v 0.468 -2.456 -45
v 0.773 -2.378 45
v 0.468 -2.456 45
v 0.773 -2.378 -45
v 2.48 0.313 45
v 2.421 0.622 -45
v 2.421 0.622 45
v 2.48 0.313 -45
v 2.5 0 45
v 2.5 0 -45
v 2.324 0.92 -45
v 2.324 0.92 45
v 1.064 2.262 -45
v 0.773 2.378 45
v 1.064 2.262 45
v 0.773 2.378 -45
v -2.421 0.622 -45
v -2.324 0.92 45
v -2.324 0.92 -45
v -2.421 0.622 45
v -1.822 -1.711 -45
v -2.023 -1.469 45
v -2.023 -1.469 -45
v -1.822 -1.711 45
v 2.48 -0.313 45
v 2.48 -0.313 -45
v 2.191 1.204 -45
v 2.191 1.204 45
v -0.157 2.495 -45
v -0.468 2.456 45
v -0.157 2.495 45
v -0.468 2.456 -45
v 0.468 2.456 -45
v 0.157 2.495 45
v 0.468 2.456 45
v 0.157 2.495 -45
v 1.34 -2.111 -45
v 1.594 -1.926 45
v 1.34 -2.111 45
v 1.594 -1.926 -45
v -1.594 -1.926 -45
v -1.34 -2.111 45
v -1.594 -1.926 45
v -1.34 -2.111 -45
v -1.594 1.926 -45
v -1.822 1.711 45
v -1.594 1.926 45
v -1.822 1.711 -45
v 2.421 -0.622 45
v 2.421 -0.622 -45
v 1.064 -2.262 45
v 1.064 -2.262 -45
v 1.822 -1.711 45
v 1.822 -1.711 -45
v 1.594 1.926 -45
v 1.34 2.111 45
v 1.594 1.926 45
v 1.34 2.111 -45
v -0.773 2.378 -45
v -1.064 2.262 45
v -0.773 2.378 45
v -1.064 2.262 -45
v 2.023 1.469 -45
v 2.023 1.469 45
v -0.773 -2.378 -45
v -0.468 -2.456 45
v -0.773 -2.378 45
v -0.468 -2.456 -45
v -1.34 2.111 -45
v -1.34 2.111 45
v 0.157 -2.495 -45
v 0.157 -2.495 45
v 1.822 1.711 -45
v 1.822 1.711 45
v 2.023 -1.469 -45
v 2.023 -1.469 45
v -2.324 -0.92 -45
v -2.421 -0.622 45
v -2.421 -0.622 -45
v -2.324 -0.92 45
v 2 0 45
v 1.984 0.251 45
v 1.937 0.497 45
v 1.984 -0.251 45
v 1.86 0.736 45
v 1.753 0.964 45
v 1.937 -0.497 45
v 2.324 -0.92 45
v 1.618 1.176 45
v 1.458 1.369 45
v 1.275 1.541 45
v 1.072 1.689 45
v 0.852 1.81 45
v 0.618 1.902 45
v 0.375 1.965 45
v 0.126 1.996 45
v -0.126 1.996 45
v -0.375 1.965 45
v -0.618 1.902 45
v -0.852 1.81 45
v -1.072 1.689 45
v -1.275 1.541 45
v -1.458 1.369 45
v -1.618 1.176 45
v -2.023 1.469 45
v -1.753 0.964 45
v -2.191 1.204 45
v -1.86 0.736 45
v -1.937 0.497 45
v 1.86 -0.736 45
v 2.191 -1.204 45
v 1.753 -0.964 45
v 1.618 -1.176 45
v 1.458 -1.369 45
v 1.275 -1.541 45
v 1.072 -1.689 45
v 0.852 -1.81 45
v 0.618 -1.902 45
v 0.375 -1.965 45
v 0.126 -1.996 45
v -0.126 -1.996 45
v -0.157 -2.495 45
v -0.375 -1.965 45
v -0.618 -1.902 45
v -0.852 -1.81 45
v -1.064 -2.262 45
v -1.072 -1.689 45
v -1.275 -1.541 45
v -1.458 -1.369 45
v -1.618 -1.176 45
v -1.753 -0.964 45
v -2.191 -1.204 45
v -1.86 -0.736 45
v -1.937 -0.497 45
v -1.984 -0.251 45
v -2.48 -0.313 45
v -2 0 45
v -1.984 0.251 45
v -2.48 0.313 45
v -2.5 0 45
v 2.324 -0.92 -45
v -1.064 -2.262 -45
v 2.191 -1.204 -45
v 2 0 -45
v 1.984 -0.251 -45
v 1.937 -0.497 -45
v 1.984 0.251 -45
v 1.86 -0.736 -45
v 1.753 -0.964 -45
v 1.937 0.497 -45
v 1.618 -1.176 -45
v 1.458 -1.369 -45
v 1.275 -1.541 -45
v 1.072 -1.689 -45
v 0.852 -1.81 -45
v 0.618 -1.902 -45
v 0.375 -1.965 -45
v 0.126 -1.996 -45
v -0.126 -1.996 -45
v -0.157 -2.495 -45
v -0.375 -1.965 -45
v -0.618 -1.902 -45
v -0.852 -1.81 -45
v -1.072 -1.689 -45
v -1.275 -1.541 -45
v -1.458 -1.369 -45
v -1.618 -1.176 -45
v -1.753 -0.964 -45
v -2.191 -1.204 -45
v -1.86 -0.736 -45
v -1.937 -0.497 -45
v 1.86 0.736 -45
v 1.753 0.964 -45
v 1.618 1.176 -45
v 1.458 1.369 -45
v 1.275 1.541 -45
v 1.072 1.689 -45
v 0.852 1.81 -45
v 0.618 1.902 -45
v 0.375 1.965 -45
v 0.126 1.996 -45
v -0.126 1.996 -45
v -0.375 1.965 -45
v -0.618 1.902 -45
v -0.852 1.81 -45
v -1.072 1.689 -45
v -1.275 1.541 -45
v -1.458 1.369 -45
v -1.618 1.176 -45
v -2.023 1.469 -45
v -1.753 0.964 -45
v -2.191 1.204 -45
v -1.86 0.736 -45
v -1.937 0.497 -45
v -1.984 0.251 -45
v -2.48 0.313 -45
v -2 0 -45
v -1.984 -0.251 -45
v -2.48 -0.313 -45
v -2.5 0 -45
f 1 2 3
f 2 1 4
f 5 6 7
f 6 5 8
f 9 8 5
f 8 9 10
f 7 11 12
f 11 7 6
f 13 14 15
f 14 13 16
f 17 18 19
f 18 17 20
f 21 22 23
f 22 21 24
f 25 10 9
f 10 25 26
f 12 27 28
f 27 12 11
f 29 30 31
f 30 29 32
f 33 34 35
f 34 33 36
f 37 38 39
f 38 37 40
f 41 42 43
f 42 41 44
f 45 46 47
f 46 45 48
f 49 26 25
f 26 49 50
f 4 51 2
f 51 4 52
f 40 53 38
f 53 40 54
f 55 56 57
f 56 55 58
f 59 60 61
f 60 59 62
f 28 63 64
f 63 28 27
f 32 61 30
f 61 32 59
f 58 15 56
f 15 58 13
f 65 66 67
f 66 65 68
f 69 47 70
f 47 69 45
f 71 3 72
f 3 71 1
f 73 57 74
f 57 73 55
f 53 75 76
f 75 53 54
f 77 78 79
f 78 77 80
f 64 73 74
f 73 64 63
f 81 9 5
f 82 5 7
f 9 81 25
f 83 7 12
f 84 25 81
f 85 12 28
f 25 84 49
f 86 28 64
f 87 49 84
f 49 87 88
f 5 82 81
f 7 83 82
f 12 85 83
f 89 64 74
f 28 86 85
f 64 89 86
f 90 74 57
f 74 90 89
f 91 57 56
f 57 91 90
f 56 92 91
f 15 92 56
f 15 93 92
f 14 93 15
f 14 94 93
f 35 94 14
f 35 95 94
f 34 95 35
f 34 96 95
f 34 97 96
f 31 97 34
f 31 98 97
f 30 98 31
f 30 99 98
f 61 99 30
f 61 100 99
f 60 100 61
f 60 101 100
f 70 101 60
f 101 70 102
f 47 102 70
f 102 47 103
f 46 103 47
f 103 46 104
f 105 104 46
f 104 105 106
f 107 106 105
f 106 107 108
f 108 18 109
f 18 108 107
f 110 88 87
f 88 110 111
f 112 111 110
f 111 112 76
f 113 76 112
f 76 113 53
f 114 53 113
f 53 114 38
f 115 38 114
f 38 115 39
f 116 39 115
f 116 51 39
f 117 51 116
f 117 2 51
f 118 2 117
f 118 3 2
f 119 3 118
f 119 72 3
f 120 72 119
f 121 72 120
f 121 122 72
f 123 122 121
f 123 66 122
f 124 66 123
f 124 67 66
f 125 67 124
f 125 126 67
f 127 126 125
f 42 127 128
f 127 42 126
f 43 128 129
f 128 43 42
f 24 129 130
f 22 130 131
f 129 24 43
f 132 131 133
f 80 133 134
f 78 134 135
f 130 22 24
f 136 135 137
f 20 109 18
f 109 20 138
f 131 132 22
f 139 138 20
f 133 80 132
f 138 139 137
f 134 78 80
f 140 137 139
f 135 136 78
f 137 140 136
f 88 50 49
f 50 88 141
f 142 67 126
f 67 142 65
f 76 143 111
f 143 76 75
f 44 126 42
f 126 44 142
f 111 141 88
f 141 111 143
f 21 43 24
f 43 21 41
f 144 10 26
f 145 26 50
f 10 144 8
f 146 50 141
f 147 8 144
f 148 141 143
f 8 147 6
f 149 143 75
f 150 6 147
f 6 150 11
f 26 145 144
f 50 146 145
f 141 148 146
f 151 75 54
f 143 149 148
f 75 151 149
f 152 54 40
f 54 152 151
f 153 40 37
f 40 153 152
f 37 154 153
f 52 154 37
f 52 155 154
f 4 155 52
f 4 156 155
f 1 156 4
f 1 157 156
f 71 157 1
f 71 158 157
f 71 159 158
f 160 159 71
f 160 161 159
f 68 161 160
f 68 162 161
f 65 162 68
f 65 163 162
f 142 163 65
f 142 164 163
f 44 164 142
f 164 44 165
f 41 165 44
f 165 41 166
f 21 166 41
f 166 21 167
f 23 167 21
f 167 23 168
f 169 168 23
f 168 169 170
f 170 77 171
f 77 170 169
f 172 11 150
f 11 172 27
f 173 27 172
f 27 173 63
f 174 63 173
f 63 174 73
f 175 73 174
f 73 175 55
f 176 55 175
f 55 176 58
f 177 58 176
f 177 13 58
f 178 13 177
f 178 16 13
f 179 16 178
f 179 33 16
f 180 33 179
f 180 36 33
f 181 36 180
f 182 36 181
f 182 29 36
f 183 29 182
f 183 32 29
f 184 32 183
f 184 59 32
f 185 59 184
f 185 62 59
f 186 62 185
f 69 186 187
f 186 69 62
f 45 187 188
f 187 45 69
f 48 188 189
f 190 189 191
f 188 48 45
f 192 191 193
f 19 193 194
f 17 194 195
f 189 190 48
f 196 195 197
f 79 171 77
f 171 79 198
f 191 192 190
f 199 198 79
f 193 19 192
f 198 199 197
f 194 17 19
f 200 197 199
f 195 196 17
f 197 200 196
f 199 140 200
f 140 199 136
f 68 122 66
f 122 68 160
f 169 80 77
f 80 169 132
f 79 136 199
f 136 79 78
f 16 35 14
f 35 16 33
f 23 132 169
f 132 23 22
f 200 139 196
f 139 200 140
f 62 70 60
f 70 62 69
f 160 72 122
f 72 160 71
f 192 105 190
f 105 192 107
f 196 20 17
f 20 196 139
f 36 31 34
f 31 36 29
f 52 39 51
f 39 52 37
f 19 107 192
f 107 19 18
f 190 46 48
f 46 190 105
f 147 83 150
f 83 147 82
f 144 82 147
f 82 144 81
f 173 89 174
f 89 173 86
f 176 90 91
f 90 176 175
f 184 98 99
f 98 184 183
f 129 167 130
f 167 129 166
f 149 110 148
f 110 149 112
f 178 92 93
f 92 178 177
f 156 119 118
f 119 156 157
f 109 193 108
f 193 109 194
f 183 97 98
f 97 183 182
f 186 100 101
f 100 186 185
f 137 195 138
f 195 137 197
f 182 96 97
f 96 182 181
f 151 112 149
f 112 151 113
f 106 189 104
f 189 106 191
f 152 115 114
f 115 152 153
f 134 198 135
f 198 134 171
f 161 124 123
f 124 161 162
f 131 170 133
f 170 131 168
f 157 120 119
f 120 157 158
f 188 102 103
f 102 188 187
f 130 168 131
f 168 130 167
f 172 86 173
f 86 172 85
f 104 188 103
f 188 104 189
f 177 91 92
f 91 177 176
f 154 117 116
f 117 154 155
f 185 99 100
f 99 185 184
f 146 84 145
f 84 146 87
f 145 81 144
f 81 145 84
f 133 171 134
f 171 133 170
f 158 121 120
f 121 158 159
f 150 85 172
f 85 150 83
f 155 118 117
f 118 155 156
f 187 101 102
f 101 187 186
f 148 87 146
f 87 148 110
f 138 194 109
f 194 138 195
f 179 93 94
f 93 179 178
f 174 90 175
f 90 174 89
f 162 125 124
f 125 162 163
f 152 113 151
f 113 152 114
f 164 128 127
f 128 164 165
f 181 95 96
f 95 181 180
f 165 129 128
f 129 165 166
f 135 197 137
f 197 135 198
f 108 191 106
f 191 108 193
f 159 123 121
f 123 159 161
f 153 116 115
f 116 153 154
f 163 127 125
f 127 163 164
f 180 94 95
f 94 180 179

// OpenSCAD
$fn = 50;


difference() {
	union() {
		translate(v = [0, 0, -45.0000000000]) {
			cylinder(h = 90, r = 2.5000000000);
		}
	}
	union() {
		translate(v = [0, 0, -100.0000000000]) {
			cylinder(h = 200, r = 2.0000000000);
		}
	}
}
